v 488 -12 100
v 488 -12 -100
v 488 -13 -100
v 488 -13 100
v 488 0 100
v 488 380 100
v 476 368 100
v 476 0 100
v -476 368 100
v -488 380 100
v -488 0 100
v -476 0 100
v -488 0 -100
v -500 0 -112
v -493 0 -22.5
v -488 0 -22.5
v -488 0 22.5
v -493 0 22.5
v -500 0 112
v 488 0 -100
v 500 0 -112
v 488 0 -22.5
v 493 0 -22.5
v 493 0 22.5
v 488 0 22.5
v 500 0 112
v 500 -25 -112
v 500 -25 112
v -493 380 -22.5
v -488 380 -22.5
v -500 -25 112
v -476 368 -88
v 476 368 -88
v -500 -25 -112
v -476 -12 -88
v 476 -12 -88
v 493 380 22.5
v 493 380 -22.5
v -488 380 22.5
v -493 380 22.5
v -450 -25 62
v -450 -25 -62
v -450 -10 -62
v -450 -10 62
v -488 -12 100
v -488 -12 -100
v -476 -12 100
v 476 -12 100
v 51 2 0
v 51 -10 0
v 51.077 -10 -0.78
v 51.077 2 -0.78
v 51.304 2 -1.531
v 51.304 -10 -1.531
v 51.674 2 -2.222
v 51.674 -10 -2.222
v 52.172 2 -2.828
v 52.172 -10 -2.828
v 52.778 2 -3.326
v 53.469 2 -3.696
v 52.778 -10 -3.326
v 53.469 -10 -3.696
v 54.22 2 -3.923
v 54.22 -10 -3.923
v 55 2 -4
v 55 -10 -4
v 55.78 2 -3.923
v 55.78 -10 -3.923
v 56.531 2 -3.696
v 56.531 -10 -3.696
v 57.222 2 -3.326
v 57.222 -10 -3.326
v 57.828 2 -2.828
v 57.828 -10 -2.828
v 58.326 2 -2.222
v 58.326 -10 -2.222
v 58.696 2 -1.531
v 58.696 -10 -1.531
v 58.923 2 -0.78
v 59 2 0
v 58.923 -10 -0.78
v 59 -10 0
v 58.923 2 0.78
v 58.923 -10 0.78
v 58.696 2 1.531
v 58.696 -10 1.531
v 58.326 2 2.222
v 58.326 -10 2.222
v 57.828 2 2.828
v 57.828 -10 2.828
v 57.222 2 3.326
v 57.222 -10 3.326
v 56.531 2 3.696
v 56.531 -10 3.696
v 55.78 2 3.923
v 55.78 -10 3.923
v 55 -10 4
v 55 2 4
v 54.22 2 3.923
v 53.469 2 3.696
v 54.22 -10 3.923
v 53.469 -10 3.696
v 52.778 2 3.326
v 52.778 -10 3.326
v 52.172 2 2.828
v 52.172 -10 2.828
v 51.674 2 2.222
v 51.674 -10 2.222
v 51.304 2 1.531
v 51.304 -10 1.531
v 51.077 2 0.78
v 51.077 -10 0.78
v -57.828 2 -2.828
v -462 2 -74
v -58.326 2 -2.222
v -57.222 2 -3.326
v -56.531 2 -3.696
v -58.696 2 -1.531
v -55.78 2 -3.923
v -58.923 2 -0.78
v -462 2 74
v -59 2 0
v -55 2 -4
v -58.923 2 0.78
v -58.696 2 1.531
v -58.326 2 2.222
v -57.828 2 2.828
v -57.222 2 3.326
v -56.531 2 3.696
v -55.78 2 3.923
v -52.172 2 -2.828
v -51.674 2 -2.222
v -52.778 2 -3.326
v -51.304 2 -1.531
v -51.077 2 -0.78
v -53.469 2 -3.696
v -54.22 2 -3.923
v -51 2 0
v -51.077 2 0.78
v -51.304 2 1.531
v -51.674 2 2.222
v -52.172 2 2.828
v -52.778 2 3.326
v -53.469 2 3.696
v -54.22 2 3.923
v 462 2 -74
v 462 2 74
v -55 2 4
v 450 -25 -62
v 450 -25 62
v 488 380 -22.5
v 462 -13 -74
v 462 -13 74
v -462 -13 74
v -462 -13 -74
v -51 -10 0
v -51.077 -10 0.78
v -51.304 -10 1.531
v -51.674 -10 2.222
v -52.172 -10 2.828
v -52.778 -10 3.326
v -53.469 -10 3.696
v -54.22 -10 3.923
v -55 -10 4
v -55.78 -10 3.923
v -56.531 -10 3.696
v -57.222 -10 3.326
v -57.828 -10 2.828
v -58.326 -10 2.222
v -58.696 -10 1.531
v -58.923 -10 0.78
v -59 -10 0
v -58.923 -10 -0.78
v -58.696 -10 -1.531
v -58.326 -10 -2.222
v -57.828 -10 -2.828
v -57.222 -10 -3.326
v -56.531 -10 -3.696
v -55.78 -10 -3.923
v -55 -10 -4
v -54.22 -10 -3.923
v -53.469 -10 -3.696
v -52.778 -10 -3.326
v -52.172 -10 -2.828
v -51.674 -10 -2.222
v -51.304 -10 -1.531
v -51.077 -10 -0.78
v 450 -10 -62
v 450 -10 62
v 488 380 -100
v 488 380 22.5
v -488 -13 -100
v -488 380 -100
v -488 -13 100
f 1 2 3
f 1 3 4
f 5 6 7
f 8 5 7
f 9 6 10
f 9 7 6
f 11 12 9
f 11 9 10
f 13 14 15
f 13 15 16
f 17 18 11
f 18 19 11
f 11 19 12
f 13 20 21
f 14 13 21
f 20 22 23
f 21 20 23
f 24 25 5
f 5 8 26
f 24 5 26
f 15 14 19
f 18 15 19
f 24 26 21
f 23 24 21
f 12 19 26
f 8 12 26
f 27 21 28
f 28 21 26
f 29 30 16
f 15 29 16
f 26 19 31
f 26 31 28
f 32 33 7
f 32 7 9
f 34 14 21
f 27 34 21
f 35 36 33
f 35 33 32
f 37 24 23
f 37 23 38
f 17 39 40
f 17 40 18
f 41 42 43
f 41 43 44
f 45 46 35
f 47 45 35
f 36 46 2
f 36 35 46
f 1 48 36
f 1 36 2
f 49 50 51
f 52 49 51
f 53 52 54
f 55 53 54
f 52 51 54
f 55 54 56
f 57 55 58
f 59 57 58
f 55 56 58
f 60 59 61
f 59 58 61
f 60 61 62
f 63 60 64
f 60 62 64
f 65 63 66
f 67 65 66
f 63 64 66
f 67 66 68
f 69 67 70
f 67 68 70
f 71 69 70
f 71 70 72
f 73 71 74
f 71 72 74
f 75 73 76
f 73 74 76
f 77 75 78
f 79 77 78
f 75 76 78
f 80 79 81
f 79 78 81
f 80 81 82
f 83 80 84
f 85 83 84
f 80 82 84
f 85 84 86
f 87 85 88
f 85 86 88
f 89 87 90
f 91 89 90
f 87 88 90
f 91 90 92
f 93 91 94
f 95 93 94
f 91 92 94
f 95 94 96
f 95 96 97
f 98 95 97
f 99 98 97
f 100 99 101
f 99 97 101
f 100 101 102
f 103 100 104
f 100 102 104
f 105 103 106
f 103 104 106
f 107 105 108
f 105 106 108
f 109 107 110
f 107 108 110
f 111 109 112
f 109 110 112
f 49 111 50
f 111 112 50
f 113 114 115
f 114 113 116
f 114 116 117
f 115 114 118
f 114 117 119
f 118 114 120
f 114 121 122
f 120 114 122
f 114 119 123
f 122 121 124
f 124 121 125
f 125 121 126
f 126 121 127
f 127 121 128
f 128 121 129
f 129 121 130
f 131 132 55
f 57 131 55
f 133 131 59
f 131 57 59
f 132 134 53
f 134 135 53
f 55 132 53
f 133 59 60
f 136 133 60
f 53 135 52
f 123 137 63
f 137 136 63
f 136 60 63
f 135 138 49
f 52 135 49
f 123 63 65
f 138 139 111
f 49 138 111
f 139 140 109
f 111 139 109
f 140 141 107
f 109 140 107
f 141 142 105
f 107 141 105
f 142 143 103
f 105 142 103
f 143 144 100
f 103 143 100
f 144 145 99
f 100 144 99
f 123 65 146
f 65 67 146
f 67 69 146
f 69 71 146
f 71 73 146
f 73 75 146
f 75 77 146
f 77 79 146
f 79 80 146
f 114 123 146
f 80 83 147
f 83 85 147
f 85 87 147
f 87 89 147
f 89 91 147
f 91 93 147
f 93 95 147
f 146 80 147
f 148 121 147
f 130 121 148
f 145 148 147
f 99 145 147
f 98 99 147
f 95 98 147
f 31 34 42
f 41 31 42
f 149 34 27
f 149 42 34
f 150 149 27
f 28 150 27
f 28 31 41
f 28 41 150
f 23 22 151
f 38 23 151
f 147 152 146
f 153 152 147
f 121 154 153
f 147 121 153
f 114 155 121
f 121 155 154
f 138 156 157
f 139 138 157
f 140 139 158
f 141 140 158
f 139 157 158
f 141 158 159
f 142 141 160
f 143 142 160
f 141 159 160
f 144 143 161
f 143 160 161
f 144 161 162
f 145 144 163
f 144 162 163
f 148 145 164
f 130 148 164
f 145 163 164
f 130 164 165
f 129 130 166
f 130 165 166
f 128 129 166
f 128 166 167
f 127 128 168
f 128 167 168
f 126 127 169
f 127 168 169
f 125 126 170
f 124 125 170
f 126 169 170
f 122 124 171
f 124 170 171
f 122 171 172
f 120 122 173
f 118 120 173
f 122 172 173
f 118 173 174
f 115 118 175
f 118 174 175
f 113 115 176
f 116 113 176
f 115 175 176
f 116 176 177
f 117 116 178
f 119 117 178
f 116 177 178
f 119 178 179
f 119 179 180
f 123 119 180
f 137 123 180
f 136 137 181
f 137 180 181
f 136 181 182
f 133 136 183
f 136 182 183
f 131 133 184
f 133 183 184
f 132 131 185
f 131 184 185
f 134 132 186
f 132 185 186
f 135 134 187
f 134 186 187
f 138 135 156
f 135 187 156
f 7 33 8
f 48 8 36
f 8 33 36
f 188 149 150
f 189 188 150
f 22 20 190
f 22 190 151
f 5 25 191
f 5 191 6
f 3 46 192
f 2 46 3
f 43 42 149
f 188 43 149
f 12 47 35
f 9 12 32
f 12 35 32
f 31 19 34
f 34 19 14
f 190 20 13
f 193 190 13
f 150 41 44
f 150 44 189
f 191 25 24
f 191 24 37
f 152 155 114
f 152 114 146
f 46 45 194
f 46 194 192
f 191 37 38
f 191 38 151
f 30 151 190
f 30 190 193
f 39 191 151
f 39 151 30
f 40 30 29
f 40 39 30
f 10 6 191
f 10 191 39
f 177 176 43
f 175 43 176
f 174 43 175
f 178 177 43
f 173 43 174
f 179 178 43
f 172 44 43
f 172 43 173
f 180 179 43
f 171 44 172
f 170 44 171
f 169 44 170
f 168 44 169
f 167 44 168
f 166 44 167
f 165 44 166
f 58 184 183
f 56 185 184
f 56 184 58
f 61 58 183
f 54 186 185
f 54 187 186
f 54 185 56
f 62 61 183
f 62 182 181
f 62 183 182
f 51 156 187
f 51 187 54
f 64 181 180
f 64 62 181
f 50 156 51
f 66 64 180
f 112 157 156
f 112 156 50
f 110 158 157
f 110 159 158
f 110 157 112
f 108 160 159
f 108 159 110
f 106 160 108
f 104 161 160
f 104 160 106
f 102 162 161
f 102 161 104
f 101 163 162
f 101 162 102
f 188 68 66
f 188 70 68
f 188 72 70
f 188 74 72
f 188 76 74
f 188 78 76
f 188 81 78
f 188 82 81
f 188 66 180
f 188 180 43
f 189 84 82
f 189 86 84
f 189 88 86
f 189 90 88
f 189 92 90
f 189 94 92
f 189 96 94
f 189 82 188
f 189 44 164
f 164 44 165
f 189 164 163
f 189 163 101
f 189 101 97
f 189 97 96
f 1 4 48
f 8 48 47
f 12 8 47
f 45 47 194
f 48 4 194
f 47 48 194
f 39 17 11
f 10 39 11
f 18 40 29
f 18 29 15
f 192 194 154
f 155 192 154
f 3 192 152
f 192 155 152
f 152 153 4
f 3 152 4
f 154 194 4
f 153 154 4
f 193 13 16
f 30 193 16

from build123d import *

# Parameters (mm, degrees)
F0_W      = 1000
F0_H      = 5.5340008238
F0_H_2    = 212.9319983523
F1_DEPTH  = 25
F2_W      = 900
F2_H      = 124
F3_DEPTH  = 15
F4_W      = 976
F4_H      = 200
F5_DEPTH  = 380
F6_T      = -12
F7_W      = 380
F7_H      = 45
F8_DEPTH  = 5
F9_W      = 380
F9_H      = 45
F10_DEPTH = 5
F11_R     = 4
F12_DEPTH = 12


# Not quite as in the source:
# - a shell that OpenCascade refuses in one call is made with other operations: the cavity is built on its own and cut out


with BuildPart() as f1:
    # F0 (on Front) → F1 (new body)
    with BuildSketch(Plane.XZ):
        with Locations((0, 109.2329995881)):
            Rectangle(F0_W, F0_H)
        Rectangle(F0_W, F0_H_2)
        with Locations((0, -109.2329995881)):
            Rectangle(F0_W, F0_H)
    extrude(amount=F1_DEPTH)

    # F2 (on face) → F3 (cut)
    with BuildSketch(Plane.XZ.offset(25)):
        Rectangle(F2_W, F2_H)
    extrude(amount=-F3_DEPTH, mode=Mode.SUBTRACT)

    # F4 (on face) → F5 (join)
    with BuildSketch(Plane(origin=(0, 0, 0), x_dir=(-1, 0, 0), z_dir=(0, 1, 0))):
        Rectangle(F4_W, F4_H)
    extrude(amount=F5_DEPTH)

    # F6: a shell. OpenCascade refuses it in one call, so the cavity is built on its own and cut out:
    # the body offset inwards by the wall thickness, plus a prism from it out through each open face.
    f6_core = offset(f1.part, amount=F6_T, kind=Kind.INTERSECTION, mode=Mode.PRIVATE)
    f6_exits = [f6_core.faces().sort_by_distance(p)[0] for p in [
        (0, 178, 88),
    ]]
    add(f6_core, mode=Mode.SUBTRACT)
    extrude(f6_exits, amount=-F6_T, mode=Mode.SUBTRACT)

    # F7 (on face) → F8 (join)
    with BuildSketch(Plane(origin=(-488, 0, 0), x_dir=(0, -1, 0), z_dir=(-1, 0, 0))):
        with Locations((-190, 0)):
            Rectangle(F7_W, F7_H)
    extrude(amount=F8_DEPTH)

    # F9 (on face) → F10 (join)
    with BuildSketch(Plane.YZ.offset(488)):
        with Locations((190, 0)):
            Rectangle(F9_W, F9_H)
    extrude(amount=F10_DEPTH)

    # F11 (on face) → F12 (cut, through all)
    with BuildSketch(Plane.XZ.offset(10)):
        with Locations((-55, 0)):
            Circle(F11_R)
        with BuildLine():
            ThreePointArc((59, 0), (55, 4), (51, 0))
            ThreePointArc((51, 0), (55, -4), (59, 0))
        make_face()
    extrude(amount=-F12_DEPTH, mode=Mode.SUBTRACT)


solid = f1.part
